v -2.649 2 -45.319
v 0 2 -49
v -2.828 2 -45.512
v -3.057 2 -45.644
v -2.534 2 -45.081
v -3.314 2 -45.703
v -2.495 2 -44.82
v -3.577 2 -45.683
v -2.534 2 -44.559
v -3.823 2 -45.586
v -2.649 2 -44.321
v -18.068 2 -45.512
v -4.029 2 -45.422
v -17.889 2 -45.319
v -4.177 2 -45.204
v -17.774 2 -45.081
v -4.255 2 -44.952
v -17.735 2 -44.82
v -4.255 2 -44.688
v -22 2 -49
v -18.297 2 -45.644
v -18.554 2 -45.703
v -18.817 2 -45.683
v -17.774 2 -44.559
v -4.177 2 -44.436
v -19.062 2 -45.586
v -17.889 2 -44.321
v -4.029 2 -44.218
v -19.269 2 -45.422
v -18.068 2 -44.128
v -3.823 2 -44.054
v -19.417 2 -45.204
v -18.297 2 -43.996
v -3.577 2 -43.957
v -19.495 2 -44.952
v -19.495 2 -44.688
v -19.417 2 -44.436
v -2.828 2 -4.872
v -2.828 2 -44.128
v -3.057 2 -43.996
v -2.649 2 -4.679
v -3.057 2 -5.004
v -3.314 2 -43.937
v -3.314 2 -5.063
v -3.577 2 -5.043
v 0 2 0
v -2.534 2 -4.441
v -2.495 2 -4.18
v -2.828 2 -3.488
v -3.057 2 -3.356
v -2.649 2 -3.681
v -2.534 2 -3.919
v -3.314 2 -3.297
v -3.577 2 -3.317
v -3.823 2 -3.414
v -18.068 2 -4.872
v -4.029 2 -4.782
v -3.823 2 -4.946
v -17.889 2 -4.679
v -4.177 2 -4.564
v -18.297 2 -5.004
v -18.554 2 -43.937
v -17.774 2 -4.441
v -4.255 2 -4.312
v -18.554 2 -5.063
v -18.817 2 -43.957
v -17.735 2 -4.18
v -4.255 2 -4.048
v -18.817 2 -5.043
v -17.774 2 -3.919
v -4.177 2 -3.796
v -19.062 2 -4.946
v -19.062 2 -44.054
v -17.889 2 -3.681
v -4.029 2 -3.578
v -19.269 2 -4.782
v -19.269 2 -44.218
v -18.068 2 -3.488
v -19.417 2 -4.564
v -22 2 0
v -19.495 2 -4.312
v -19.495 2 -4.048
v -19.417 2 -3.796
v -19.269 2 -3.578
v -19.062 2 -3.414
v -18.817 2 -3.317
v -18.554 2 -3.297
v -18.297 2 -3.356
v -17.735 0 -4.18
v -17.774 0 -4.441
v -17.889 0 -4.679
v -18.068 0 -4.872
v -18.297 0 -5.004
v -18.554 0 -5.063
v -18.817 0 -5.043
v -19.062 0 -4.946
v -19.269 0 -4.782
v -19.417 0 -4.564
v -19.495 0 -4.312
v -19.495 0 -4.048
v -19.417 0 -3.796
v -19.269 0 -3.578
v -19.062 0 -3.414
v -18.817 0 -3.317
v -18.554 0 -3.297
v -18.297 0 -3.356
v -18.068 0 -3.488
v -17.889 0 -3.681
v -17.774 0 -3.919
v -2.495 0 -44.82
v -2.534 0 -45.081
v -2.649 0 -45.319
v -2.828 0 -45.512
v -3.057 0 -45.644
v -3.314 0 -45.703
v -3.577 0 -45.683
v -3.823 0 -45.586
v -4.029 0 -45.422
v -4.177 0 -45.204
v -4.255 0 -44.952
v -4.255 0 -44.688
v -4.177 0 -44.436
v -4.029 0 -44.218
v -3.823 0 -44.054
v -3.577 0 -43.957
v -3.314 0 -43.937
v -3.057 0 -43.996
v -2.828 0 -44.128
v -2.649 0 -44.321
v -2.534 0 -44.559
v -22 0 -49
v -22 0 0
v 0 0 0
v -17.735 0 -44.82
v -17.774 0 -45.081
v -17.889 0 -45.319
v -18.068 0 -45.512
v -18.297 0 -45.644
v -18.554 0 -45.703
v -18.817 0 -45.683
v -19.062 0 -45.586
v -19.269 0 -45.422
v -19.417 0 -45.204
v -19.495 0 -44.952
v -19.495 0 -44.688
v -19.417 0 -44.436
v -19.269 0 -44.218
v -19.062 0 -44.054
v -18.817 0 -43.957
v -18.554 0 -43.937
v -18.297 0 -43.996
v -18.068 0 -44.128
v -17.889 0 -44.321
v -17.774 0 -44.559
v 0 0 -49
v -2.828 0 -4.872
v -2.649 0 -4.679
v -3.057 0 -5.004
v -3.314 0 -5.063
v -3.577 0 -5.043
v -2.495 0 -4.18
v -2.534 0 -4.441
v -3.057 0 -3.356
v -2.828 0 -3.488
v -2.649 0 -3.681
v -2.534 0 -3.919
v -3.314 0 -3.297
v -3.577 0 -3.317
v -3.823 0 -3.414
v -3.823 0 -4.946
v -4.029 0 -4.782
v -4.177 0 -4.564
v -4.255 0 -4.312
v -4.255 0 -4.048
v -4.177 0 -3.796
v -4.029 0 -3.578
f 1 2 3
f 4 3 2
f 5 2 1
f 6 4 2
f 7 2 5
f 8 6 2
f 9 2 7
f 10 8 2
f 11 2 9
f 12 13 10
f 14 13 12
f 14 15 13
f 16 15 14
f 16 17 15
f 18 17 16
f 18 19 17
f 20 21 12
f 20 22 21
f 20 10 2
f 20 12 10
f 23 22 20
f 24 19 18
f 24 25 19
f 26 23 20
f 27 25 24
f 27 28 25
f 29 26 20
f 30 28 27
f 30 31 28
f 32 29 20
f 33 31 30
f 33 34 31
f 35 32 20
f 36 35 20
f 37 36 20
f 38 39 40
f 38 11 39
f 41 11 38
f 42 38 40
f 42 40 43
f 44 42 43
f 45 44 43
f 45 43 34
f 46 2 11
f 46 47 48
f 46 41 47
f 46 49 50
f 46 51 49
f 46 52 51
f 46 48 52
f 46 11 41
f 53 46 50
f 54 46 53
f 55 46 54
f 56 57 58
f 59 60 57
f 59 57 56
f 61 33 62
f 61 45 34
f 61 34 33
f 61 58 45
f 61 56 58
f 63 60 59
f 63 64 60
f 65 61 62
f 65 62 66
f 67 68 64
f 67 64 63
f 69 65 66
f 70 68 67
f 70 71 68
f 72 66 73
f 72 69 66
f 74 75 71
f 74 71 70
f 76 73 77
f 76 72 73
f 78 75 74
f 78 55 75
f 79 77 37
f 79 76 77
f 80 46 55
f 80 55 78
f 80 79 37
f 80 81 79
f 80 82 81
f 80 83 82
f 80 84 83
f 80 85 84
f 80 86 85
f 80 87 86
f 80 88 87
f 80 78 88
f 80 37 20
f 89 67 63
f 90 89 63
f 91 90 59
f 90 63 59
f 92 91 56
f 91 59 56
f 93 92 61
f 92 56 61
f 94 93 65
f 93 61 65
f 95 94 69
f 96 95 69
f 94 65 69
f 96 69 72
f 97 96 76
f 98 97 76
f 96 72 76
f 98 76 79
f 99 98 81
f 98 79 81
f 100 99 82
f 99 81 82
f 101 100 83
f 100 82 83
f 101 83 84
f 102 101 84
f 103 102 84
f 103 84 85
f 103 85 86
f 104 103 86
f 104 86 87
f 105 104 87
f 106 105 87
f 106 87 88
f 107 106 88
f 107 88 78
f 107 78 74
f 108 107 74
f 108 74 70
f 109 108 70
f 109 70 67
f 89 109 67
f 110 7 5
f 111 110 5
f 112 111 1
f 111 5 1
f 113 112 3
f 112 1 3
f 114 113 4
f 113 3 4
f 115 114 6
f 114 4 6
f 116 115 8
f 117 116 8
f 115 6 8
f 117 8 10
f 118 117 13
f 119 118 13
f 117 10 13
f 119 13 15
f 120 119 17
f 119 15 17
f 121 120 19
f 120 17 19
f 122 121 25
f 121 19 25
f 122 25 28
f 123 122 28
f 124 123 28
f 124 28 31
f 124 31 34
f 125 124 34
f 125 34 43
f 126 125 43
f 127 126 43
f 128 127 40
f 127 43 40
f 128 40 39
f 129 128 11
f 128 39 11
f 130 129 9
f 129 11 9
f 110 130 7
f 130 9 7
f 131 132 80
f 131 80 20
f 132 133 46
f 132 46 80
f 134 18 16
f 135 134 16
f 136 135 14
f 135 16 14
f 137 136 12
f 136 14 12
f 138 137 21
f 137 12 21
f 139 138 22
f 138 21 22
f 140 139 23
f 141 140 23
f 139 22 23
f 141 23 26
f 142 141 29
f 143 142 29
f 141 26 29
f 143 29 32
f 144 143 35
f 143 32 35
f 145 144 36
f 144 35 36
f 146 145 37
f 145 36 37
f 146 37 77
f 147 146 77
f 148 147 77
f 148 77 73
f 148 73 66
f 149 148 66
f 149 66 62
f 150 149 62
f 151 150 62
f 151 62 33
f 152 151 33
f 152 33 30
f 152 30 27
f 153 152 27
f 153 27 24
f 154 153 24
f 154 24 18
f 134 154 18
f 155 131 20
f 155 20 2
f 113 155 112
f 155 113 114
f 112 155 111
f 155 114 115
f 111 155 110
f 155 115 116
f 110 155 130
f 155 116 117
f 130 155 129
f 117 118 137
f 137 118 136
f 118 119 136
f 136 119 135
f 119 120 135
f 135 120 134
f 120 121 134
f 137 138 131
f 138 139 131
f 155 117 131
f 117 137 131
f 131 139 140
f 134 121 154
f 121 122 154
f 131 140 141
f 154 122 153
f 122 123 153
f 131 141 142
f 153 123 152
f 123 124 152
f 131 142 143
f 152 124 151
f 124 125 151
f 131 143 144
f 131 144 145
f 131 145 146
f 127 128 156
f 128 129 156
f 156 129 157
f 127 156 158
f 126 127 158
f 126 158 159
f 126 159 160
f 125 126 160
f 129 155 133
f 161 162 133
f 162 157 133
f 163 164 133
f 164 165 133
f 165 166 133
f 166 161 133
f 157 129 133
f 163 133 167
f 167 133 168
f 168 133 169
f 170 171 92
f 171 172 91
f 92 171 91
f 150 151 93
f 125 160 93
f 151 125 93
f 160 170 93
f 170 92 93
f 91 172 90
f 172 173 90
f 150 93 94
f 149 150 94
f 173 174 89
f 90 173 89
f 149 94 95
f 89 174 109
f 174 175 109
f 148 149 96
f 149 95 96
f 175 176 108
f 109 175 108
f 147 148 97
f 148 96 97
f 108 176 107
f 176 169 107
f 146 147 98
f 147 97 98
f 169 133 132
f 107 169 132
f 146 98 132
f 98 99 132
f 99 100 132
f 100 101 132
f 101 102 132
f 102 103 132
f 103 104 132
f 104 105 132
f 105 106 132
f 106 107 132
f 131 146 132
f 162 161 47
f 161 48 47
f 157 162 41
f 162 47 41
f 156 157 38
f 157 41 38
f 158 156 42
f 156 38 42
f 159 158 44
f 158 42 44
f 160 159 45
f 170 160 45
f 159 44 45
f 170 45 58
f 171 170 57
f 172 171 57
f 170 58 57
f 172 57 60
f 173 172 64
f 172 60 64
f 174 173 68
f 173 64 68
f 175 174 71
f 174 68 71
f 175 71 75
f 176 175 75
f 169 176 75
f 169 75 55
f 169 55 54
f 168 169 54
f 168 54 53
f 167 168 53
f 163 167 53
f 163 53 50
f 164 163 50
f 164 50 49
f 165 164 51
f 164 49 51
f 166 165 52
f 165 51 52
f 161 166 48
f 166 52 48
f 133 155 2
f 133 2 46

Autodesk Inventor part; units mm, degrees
ref_plane "YZ Plane" through (0, 0, 0) normal (1, 0, 0) x (0, 1, 0)
ref_plane "XZ Plane" through (0, 0, 0) normal (0, 1, 0) x (-1, 0, 0)
ref_plane "XY Plane" through (0, 0, 0) normal (0, 0, 1) x (1, 0, 0)
sketch "Sketch1" plane through (0, 0, 0) normal (0, 1, 0) x (-1, 0, 0)
  line L0 (0, 0) -> (22, 0)
  line L1 (22, 0) -> (22, -49)
  line L2 (22, -49) -> (0, -49)
  line L3 (0, -49) -> (0, 0)
  dimension "d0" = 22
  dimension "d1" = 49
extrude "Extrusion1" add sketch "Sketch1" along normal blind 2
sketch "Sketch2" plane through (0, 2, 0) normal (0, 1, 0) x (1, 0, 0)
  line L0 (-22, 0) -> (0, 0) projected
  line L1 (0, 0) -> (0, 49) projected
  line L2 (-18.62, 44.82) -> (-3.38, 44.82) construction
  line L3 (-3.38, 44.82) -> (-3.38, 4.18) construction
  line L4 (-3.38, 4.18) -> (-18.62, 4.18) construction
  line L5 (-18.62, 4.18) -> (-18.62, 44.82) construction
  line L6 (-18.62, 44.82) -> (-3.38, 4.18) construction
  line L7 (-3.38, 44.82) -> (-18.62, 4.18) construction
  circle A0 centre (-18.62, 4.18) radius 0.885
  circle A1 centre (-18.62, 44.82) radius 0.885
  circle A2 centre (-3.38, 44.82) radius 0.885
  circle A3 centre (-3.38, 4.18) radius 0.885
  point P0 (0, 24.5)
  point P1 (-11, 0)
  point P2 (-3.38, 0)
  point P3 (0, 4.18)
  point P4 (-11, 24.5)
  dimension "d4" = 11
  dimension "d5" = 7.62
  dimension "d6" = 20.32
  dimension "d8" = 1.77
  dimension "d9" = 1.77
  dimension "d10" = 1.77
  dimension "d11" = 1.77
extrude "Extrusion2" cut sketch "Sketch2" against normal up to next
properties part number "plate4atrduino"
